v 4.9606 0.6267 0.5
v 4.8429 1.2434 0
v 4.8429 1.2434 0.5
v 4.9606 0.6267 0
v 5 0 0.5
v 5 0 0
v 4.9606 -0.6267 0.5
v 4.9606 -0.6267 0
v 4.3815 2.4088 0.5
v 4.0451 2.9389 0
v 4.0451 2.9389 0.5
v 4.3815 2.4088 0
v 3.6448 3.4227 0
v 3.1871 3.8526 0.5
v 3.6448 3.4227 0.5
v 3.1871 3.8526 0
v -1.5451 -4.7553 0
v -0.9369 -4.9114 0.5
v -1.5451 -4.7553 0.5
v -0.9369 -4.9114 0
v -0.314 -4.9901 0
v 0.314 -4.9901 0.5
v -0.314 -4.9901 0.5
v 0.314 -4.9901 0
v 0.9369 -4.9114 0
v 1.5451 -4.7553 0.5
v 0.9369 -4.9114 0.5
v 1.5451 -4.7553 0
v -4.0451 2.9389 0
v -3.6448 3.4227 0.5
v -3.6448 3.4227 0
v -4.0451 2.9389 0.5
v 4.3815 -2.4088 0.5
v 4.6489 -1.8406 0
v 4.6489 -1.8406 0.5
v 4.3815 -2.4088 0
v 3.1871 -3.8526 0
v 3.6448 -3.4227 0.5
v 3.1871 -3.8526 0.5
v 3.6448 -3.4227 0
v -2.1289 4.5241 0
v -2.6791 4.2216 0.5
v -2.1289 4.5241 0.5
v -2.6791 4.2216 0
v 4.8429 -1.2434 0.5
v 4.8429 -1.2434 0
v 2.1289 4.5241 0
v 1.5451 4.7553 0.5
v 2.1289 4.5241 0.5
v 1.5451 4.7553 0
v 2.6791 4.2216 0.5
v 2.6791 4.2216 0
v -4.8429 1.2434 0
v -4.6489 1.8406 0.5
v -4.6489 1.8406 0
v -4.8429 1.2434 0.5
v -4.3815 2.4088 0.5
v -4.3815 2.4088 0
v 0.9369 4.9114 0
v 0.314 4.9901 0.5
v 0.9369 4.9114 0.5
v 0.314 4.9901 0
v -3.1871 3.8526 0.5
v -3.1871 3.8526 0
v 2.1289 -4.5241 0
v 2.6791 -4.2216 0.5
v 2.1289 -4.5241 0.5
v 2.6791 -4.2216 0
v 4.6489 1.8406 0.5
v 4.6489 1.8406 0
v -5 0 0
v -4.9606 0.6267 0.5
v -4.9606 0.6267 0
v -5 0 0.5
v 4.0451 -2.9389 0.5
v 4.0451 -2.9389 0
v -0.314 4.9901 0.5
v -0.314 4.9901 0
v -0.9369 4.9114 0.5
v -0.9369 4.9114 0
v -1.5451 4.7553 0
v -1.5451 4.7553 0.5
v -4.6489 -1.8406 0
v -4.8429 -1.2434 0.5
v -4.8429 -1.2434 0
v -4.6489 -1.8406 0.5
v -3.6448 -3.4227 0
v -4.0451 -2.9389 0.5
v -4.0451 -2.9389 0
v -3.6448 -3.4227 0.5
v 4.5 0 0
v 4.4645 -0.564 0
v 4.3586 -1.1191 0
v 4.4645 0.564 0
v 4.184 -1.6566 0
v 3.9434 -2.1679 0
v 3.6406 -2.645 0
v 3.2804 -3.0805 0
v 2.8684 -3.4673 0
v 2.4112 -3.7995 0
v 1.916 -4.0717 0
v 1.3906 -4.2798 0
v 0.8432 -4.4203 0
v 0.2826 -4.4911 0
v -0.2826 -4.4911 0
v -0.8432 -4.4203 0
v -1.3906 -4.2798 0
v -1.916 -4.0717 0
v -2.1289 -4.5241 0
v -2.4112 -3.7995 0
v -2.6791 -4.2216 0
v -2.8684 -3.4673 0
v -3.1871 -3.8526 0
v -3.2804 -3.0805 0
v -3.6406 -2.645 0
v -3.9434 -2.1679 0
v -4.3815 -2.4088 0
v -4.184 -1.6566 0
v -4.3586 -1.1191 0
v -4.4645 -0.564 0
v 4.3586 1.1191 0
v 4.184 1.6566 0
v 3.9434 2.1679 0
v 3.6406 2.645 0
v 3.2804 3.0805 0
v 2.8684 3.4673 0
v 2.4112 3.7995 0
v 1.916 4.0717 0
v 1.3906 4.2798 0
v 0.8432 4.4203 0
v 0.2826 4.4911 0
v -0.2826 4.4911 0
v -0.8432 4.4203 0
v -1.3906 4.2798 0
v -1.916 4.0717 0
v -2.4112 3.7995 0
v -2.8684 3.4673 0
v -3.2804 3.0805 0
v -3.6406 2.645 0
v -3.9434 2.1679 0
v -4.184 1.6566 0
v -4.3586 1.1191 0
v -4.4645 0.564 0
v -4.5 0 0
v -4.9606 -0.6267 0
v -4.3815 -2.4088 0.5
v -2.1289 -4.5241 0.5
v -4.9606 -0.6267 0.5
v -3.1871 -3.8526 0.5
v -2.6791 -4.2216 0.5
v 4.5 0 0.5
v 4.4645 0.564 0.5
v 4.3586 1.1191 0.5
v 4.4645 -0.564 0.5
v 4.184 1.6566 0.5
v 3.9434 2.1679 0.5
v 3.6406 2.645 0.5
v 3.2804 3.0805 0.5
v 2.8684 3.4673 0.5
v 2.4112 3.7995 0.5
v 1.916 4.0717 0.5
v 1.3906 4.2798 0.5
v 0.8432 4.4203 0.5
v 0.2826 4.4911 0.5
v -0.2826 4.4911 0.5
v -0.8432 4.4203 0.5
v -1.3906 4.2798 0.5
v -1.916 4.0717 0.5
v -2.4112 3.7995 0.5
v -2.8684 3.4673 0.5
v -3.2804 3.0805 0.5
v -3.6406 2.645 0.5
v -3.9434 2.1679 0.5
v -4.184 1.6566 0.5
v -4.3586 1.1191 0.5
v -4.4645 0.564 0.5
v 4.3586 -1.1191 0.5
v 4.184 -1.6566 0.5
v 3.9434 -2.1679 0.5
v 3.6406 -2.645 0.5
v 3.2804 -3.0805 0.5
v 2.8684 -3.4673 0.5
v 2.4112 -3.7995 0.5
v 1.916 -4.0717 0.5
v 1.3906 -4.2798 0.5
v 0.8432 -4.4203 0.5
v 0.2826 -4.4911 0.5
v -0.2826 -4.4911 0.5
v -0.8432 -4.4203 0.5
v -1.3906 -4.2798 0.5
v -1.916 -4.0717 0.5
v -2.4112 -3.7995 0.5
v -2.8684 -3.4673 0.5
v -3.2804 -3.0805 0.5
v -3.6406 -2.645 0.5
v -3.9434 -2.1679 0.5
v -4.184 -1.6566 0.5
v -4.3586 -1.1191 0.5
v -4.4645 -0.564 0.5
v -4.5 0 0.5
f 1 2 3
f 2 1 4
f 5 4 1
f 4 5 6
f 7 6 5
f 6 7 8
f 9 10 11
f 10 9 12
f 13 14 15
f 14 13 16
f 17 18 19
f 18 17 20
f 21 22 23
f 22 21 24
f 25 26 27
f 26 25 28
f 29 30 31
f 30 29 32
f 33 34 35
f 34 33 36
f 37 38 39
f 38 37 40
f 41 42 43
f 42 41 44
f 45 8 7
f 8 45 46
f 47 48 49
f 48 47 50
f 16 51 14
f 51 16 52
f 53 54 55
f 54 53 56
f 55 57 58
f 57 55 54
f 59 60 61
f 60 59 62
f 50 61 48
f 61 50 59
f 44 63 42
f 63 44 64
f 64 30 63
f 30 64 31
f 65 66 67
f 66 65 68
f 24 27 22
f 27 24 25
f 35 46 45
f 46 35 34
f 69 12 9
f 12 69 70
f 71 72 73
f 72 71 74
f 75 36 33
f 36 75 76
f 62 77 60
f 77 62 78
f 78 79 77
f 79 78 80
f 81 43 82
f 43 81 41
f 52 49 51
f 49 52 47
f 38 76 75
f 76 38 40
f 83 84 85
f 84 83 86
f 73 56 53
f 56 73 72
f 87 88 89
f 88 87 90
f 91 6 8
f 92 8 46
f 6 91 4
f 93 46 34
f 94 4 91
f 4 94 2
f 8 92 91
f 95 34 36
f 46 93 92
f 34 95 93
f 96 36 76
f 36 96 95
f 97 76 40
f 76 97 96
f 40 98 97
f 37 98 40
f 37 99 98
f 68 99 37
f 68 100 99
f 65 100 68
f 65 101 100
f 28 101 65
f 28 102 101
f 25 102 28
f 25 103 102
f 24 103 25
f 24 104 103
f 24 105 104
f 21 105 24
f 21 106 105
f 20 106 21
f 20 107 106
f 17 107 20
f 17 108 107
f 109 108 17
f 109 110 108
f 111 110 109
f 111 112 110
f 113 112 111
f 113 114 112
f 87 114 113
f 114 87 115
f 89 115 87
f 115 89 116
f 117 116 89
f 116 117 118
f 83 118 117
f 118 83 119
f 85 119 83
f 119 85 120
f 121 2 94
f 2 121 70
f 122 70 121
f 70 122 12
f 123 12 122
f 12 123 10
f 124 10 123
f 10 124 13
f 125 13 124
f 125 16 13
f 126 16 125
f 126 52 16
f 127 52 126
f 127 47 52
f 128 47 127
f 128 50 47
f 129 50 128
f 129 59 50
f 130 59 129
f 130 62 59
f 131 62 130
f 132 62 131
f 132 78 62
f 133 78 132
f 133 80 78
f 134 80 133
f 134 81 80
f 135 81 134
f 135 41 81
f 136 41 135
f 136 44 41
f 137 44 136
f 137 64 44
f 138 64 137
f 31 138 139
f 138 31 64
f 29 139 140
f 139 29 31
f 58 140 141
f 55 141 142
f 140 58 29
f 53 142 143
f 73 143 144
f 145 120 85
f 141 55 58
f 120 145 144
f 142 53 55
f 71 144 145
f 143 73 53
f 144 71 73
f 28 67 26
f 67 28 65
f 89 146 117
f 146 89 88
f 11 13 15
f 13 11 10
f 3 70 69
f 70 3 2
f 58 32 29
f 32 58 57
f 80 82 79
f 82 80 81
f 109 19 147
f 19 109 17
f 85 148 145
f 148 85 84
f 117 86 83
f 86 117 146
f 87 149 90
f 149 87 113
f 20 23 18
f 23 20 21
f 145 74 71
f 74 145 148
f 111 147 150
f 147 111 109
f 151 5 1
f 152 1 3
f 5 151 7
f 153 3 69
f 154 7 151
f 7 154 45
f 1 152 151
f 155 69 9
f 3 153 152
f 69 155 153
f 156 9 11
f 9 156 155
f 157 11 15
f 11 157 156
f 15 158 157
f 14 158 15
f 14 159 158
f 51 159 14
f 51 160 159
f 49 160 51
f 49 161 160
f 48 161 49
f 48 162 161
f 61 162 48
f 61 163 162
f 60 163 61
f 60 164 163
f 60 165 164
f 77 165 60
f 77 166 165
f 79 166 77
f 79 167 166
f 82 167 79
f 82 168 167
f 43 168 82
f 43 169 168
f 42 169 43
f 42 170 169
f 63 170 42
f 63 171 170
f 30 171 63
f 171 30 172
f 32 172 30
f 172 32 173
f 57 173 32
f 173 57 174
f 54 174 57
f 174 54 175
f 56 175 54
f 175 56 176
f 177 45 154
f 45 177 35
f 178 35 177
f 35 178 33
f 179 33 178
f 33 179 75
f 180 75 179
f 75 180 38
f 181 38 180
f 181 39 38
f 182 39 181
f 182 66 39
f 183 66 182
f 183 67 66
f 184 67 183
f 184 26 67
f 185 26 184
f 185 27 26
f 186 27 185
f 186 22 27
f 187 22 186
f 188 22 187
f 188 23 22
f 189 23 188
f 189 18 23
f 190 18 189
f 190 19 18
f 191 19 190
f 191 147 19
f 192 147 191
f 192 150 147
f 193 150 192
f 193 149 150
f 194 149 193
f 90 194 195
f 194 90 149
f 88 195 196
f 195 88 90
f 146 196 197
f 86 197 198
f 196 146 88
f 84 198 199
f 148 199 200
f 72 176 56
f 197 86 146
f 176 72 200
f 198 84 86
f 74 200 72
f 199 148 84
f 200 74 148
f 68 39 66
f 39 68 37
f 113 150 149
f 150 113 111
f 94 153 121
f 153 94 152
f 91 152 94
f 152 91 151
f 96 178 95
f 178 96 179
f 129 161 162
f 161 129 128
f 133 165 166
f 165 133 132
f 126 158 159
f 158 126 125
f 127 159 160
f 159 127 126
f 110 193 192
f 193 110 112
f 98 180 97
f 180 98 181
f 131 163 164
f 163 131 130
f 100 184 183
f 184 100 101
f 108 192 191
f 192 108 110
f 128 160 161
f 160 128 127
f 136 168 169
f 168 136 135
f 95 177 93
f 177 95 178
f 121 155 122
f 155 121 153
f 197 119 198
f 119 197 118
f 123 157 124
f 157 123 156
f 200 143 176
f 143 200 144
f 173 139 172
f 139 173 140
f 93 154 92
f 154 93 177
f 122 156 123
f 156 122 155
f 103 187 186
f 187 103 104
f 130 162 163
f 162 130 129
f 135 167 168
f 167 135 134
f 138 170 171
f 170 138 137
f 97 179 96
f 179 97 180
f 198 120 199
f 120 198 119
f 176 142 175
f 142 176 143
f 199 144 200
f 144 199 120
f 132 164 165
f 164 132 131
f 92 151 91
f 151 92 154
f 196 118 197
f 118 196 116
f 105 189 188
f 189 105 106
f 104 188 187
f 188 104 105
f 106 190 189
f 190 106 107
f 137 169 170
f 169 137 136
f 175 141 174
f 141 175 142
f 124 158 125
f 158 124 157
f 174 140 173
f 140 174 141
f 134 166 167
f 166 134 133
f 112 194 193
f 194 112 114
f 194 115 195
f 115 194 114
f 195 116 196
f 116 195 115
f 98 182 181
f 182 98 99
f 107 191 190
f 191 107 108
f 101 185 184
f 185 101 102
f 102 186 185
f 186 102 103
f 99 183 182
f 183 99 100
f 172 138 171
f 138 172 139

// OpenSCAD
//3D printable O-ring Customizer Project MY4777
//Aubrey Woern 10-3-2018

OD = 10; //Outer Diameter in mm 

ID = 9	; // Inner Diameter in mm

Height = 0.5; // Height of O-ring in mm

$fn=50;

difference(){ cylinder (d=OD,h=Height); //ring OD
              
					cylinder(d=ID,h=Height+20,center=true);
}
